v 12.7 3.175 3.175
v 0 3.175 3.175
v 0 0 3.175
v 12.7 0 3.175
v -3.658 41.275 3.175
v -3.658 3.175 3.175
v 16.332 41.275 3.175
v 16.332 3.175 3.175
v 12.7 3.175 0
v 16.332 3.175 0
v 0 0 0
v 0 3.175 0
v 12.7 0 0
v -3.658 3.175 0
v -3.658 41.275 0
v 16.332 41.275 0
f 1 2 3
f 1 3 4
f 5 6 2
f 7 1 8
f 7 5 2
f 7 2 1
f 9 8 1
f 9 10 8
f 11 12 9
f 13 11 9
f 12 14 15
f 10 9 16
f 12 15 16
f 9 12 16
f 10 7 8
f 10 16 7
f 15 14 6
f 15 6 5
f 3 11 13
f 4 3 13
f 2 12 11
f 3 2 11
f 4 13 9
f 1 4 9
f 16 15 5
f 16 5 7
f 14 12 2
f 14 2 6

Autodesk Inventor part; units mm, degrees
ref_plane "YZ Plane" through (0, 0, 0) normal (1, 0, 0) x (0, 1, 0)
ref_plane "XZ Plane" through (0, 0, 0) normal (0, 1, 0) x (-1, 0, 0)
ref_plane "XY Plane" through (0, 0, 0) normal (0, 0, 1) x (1, 0, 0)
sketch "Sketch1" plane through (0, 0, 0) normal (0, 0, 1) x (1, 0, 0)
  line L0 (0, 0) -> (12.7, 0)
  line L1 (12.7, 0) -> (12.7, 3.175)
  line L2 (12.7, 3.175) -> (0, 3.175)
  line L3 (0, 3.175) -> (0, 0)
  line L4 (-3.6576, 41.275) -> (16.3322, 41.275)
  line L5 (16.3322, 41.275) -> (16.3322, 3.175)
  line L6 (16.3322, 3.175) -> (-3.6576, 3.175)
  line L7 (-3.6576, 3.175) -> (-3.6576, 41.275)
  point P0 (16.3322, 22.225)
  point P1 (-3.6576, 22.225)
  point P2 (12.7, 3.175)
  point P3 (0, 3.175)
  dimension "d0" = 12.7
  dimension "d1" = 3.175
  dimension "d2" = 19.9898
  dimension "d3" = 3.6576
  dimension "d4" = 38.1
extrude "Extrusion1" add sketch "Sketch1" along normal blind 3.175
properties part number "servo short side"
